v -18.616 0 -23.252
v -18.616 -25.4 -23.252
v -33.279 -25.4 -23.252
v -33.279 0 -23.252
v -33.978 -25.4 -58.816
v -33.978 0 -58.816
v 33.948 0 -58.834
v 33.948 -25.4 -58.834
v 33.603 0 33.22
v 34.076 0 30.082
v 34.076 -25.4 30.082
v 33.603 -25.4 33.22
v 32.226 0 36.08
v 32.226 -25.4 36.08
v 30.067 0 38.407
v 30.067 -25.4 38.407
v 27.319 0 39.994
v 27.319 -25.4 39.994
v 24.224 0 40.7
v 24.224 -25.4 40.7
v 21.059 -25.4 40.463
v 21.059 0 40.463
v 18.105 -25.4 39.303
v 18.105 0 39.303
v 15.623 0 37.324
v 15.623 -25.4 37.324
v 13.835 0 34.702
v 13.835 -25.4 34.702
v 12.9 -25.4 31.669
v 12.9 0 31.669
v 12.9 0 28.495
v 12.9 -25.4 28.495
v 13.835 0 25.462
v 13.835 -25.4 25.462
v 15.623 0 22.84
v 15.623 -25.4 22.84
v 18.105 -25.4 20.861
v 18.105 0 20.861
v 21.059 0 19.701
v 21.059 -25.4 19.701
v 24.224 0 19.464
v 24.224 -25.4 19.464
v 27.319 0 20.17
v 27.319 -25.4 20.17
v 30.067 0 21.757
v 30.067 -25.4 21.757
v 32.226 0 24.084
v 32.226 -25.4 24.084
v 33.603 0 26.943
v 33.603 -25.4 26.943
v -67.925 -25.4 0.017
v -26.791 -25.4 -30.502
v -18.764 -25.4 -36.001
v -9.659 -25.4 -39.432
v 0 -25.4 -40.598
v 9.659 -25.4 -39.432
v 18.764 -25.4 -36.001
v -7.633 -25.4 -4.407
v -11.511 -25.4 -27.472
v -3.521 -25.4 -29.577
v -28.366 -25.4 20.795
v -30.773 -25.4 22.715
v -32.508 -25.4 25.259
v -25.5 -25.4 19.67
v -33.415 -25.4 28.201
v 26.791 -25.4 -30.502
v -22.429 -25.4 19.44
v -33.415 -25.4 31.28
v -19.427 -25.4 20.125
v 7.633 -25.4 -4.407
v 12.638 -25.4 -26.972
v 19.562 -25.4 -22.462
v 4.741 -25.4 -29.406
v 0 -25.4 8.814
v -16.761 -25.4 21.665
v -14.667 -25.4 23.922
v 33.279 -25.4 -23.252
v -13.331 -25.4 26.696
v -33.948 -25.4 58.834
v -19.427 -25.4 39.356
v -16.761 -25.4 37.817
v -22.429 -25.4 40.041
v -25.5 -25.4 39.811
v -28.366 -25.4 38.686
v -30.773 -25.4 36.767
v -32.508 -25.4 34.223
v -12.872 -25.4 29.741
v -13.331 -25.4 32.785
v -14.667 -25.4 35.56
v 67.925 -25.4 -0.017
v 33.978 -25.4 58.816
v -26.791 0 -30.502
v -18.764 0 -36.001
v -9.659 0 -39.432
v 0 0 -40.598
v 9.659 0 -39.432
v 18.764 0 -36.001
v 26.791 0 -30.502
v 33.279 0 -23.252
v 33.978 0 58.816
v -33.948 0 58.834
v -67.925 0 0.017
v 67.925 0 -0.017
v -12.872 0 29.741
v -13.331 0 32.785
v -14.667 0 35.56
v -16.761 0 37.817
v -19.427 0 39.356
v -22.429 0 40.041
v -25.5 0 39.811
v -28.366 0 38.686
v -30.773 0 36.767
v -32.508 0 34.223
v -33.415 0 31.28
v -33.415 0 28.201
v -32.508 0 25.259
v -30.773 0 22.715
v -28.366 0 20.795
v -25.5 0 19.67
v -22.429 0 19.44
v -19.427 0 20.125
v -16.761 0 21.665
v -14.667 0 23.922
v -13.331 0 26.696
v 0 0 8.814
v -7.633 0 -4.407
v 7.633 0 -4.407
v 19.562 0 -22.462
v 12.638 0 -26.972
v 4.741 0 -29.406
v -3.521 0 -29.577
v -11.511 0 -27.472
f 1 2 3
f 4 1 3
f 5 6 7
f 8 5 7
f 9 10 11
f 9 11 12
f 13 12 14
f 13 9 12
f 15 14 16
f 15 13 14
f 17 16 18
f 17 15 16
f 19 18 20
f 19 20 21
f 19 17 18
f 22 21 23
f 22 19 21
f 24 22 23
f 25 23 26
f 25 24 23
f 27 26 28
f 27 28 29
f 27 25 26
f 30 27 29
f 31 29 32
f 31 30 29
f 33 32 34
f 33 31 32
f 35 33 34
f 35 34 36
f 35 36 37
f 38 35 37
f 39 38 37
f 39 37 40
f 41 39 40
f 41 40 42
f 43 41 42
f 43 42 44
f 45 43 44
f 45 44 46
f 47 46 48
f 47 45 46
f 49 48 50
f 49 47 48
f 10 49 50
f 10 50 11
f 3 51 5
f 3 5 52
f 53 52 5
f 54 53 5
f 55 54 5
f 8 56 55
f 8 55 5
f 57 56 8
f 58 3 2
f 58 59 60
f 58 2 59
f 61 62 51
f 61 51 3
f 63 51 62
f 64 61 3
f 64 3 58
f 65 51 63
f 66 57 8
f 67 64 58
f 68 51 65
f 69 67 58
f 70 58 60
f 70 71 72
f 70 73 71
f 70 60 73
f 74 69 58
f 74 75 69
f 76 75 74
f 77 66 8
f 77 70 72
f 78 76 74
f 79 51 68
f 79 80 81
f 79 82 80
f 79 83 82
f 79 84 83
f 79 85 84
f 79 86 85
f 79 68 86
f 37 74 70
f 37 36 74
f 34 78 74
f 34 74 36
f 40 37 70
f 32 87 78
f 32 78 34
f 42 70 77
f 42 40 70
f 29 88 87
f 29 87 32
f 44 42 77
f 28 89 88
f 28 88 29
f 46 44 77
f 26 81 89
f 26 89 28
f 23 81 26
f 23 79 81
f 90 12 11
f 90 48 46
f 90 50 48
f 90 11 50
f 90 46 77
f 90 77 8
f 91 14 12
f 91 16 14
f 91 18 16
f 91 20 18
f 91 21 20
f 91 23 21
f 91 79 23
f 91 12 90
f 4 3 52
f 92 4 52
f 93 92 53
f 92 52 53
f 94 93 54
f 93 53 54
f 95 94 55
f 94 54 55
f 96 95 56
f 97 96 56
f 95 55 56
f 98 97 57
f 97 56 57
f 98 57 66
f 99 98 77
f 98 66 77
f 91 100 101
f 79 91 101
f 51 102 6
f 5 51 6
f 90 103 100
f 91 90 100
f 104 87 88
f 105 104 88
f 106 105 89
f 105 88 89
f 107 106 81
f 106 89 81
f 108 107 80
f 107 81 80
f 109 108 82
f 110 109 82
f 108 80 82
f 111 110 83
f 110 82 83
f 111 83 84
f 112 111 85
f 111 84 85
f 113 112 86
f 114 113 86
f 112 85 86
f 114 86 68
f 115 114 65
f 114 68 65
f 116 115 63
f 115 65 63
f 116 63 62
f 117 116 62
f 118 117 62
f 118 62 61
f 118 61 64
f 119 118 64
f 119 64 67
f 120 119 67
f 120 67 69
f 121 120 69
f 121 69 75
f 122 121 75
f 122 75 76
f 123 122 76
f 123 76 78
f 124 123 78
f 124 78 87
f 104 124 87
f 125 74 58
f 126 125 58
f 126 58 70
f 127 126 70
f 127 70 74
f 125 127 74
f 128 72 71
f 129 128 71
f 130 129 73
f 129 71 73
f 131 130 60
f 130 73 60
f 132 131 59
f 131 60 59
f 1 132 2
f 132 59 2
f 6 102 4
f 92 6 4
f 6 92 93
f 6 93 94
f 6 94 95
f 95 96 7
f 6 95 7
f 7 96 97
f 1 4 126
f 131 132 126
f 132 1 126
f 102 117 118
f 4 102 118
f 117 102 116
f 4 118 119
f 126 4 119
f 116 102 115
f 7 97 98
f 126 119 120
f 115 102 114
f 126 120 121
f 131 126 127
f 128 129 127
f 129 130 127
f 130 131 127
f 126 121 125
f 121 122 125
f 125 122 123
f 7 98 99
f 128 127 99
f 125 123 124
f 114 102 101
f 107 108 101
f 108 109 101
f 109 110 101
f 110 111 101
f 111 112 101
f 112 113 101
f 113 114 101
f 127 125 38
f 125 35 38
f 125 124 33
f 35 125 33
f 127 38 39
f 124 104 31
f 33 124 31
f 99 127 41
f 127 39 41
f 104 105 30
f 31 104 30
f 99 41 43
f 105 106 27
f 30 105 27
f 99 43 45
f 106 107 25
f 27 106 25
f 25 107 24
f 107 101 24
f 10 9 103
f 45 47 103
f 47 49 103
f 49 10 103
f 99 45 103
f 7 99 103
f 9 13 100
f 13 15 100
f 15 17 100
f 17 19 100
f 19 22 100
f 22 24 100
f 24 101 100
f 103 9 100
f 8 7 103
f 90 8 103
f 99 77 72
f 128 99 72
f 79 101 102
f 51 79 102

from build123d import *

# Parameters (mm, degrees)
F1_DEPTH = 25.4
F2_R     = 10.329538
F3_DEPTH = 25.401
F4_R     = 10.647707
F5_DEPTH = 25.4
F7_DEPTH = 25.4
F9_DEPTH = 25.4


with BuildPart() as f1:
    # F0 (on Front) → F1 (new body)
    with BuildSketch(Plane.XZ):
        Polygon((-67.925481, 0.01739), (-33.977801, -58.816497), (33.94768, -58.833887), (67.925481, -0.01739), (33.977801, 58.816497), (-33.94768, 58.833887), align=None)
    extrude(amount=F1_DEPTH)

    # F2 (on face) → F3 (cut, through all)
    with BuildSketch(Plane.XZ.offset(25.4)):
        with Locations((-23.201194, 29.740747)):
            Circle(F2_R)
    extrude(amount=-F3_DEPTH, mode=Mode.SUBTRACT)

    # F4 (on Front) → F5 (cut)
    with BuildSketch(Plane.XZ):
        with Locations((23.428654, 30.081941)):
            Circle(F4_R)
    extrude(amount=F5_DEPTH, mode=Mode.SUBTRACT)

    # F6 (on face) → F7 (cut)
    with BuildSketch(Plane.XZ.offset(25.4)):
        Polygon((7.633303, -4.40709), (0, 8.814179), (-7.633303, -4.40709), align=None)
    extrude(amount=-F7_DEPTH, mode=Mode.SUBTRACT)

    # F8 (on face) → F9 (cut)
    with BuildSketch(Plane.XZ.offset(25.4)):
        with BuildLine():
            Line((-18.615896, -23.2519), (-33.279214, -23.2519))
            ThreePointArc((-33.279214, -23.2519), (0, -40.5975), (33.279214, -23.2519))
            Line((33.279214, -23.2519), (19.561792, -22.46194))
            ThreePointArc((19.561792, -22.46194), (0.616189, -29.779569), (-18.615896, -23.2519))
        make_face()
    extrude(amount=-F9_DEPTH, mode=Mode.SUBTRACT)


solid = f1.part
